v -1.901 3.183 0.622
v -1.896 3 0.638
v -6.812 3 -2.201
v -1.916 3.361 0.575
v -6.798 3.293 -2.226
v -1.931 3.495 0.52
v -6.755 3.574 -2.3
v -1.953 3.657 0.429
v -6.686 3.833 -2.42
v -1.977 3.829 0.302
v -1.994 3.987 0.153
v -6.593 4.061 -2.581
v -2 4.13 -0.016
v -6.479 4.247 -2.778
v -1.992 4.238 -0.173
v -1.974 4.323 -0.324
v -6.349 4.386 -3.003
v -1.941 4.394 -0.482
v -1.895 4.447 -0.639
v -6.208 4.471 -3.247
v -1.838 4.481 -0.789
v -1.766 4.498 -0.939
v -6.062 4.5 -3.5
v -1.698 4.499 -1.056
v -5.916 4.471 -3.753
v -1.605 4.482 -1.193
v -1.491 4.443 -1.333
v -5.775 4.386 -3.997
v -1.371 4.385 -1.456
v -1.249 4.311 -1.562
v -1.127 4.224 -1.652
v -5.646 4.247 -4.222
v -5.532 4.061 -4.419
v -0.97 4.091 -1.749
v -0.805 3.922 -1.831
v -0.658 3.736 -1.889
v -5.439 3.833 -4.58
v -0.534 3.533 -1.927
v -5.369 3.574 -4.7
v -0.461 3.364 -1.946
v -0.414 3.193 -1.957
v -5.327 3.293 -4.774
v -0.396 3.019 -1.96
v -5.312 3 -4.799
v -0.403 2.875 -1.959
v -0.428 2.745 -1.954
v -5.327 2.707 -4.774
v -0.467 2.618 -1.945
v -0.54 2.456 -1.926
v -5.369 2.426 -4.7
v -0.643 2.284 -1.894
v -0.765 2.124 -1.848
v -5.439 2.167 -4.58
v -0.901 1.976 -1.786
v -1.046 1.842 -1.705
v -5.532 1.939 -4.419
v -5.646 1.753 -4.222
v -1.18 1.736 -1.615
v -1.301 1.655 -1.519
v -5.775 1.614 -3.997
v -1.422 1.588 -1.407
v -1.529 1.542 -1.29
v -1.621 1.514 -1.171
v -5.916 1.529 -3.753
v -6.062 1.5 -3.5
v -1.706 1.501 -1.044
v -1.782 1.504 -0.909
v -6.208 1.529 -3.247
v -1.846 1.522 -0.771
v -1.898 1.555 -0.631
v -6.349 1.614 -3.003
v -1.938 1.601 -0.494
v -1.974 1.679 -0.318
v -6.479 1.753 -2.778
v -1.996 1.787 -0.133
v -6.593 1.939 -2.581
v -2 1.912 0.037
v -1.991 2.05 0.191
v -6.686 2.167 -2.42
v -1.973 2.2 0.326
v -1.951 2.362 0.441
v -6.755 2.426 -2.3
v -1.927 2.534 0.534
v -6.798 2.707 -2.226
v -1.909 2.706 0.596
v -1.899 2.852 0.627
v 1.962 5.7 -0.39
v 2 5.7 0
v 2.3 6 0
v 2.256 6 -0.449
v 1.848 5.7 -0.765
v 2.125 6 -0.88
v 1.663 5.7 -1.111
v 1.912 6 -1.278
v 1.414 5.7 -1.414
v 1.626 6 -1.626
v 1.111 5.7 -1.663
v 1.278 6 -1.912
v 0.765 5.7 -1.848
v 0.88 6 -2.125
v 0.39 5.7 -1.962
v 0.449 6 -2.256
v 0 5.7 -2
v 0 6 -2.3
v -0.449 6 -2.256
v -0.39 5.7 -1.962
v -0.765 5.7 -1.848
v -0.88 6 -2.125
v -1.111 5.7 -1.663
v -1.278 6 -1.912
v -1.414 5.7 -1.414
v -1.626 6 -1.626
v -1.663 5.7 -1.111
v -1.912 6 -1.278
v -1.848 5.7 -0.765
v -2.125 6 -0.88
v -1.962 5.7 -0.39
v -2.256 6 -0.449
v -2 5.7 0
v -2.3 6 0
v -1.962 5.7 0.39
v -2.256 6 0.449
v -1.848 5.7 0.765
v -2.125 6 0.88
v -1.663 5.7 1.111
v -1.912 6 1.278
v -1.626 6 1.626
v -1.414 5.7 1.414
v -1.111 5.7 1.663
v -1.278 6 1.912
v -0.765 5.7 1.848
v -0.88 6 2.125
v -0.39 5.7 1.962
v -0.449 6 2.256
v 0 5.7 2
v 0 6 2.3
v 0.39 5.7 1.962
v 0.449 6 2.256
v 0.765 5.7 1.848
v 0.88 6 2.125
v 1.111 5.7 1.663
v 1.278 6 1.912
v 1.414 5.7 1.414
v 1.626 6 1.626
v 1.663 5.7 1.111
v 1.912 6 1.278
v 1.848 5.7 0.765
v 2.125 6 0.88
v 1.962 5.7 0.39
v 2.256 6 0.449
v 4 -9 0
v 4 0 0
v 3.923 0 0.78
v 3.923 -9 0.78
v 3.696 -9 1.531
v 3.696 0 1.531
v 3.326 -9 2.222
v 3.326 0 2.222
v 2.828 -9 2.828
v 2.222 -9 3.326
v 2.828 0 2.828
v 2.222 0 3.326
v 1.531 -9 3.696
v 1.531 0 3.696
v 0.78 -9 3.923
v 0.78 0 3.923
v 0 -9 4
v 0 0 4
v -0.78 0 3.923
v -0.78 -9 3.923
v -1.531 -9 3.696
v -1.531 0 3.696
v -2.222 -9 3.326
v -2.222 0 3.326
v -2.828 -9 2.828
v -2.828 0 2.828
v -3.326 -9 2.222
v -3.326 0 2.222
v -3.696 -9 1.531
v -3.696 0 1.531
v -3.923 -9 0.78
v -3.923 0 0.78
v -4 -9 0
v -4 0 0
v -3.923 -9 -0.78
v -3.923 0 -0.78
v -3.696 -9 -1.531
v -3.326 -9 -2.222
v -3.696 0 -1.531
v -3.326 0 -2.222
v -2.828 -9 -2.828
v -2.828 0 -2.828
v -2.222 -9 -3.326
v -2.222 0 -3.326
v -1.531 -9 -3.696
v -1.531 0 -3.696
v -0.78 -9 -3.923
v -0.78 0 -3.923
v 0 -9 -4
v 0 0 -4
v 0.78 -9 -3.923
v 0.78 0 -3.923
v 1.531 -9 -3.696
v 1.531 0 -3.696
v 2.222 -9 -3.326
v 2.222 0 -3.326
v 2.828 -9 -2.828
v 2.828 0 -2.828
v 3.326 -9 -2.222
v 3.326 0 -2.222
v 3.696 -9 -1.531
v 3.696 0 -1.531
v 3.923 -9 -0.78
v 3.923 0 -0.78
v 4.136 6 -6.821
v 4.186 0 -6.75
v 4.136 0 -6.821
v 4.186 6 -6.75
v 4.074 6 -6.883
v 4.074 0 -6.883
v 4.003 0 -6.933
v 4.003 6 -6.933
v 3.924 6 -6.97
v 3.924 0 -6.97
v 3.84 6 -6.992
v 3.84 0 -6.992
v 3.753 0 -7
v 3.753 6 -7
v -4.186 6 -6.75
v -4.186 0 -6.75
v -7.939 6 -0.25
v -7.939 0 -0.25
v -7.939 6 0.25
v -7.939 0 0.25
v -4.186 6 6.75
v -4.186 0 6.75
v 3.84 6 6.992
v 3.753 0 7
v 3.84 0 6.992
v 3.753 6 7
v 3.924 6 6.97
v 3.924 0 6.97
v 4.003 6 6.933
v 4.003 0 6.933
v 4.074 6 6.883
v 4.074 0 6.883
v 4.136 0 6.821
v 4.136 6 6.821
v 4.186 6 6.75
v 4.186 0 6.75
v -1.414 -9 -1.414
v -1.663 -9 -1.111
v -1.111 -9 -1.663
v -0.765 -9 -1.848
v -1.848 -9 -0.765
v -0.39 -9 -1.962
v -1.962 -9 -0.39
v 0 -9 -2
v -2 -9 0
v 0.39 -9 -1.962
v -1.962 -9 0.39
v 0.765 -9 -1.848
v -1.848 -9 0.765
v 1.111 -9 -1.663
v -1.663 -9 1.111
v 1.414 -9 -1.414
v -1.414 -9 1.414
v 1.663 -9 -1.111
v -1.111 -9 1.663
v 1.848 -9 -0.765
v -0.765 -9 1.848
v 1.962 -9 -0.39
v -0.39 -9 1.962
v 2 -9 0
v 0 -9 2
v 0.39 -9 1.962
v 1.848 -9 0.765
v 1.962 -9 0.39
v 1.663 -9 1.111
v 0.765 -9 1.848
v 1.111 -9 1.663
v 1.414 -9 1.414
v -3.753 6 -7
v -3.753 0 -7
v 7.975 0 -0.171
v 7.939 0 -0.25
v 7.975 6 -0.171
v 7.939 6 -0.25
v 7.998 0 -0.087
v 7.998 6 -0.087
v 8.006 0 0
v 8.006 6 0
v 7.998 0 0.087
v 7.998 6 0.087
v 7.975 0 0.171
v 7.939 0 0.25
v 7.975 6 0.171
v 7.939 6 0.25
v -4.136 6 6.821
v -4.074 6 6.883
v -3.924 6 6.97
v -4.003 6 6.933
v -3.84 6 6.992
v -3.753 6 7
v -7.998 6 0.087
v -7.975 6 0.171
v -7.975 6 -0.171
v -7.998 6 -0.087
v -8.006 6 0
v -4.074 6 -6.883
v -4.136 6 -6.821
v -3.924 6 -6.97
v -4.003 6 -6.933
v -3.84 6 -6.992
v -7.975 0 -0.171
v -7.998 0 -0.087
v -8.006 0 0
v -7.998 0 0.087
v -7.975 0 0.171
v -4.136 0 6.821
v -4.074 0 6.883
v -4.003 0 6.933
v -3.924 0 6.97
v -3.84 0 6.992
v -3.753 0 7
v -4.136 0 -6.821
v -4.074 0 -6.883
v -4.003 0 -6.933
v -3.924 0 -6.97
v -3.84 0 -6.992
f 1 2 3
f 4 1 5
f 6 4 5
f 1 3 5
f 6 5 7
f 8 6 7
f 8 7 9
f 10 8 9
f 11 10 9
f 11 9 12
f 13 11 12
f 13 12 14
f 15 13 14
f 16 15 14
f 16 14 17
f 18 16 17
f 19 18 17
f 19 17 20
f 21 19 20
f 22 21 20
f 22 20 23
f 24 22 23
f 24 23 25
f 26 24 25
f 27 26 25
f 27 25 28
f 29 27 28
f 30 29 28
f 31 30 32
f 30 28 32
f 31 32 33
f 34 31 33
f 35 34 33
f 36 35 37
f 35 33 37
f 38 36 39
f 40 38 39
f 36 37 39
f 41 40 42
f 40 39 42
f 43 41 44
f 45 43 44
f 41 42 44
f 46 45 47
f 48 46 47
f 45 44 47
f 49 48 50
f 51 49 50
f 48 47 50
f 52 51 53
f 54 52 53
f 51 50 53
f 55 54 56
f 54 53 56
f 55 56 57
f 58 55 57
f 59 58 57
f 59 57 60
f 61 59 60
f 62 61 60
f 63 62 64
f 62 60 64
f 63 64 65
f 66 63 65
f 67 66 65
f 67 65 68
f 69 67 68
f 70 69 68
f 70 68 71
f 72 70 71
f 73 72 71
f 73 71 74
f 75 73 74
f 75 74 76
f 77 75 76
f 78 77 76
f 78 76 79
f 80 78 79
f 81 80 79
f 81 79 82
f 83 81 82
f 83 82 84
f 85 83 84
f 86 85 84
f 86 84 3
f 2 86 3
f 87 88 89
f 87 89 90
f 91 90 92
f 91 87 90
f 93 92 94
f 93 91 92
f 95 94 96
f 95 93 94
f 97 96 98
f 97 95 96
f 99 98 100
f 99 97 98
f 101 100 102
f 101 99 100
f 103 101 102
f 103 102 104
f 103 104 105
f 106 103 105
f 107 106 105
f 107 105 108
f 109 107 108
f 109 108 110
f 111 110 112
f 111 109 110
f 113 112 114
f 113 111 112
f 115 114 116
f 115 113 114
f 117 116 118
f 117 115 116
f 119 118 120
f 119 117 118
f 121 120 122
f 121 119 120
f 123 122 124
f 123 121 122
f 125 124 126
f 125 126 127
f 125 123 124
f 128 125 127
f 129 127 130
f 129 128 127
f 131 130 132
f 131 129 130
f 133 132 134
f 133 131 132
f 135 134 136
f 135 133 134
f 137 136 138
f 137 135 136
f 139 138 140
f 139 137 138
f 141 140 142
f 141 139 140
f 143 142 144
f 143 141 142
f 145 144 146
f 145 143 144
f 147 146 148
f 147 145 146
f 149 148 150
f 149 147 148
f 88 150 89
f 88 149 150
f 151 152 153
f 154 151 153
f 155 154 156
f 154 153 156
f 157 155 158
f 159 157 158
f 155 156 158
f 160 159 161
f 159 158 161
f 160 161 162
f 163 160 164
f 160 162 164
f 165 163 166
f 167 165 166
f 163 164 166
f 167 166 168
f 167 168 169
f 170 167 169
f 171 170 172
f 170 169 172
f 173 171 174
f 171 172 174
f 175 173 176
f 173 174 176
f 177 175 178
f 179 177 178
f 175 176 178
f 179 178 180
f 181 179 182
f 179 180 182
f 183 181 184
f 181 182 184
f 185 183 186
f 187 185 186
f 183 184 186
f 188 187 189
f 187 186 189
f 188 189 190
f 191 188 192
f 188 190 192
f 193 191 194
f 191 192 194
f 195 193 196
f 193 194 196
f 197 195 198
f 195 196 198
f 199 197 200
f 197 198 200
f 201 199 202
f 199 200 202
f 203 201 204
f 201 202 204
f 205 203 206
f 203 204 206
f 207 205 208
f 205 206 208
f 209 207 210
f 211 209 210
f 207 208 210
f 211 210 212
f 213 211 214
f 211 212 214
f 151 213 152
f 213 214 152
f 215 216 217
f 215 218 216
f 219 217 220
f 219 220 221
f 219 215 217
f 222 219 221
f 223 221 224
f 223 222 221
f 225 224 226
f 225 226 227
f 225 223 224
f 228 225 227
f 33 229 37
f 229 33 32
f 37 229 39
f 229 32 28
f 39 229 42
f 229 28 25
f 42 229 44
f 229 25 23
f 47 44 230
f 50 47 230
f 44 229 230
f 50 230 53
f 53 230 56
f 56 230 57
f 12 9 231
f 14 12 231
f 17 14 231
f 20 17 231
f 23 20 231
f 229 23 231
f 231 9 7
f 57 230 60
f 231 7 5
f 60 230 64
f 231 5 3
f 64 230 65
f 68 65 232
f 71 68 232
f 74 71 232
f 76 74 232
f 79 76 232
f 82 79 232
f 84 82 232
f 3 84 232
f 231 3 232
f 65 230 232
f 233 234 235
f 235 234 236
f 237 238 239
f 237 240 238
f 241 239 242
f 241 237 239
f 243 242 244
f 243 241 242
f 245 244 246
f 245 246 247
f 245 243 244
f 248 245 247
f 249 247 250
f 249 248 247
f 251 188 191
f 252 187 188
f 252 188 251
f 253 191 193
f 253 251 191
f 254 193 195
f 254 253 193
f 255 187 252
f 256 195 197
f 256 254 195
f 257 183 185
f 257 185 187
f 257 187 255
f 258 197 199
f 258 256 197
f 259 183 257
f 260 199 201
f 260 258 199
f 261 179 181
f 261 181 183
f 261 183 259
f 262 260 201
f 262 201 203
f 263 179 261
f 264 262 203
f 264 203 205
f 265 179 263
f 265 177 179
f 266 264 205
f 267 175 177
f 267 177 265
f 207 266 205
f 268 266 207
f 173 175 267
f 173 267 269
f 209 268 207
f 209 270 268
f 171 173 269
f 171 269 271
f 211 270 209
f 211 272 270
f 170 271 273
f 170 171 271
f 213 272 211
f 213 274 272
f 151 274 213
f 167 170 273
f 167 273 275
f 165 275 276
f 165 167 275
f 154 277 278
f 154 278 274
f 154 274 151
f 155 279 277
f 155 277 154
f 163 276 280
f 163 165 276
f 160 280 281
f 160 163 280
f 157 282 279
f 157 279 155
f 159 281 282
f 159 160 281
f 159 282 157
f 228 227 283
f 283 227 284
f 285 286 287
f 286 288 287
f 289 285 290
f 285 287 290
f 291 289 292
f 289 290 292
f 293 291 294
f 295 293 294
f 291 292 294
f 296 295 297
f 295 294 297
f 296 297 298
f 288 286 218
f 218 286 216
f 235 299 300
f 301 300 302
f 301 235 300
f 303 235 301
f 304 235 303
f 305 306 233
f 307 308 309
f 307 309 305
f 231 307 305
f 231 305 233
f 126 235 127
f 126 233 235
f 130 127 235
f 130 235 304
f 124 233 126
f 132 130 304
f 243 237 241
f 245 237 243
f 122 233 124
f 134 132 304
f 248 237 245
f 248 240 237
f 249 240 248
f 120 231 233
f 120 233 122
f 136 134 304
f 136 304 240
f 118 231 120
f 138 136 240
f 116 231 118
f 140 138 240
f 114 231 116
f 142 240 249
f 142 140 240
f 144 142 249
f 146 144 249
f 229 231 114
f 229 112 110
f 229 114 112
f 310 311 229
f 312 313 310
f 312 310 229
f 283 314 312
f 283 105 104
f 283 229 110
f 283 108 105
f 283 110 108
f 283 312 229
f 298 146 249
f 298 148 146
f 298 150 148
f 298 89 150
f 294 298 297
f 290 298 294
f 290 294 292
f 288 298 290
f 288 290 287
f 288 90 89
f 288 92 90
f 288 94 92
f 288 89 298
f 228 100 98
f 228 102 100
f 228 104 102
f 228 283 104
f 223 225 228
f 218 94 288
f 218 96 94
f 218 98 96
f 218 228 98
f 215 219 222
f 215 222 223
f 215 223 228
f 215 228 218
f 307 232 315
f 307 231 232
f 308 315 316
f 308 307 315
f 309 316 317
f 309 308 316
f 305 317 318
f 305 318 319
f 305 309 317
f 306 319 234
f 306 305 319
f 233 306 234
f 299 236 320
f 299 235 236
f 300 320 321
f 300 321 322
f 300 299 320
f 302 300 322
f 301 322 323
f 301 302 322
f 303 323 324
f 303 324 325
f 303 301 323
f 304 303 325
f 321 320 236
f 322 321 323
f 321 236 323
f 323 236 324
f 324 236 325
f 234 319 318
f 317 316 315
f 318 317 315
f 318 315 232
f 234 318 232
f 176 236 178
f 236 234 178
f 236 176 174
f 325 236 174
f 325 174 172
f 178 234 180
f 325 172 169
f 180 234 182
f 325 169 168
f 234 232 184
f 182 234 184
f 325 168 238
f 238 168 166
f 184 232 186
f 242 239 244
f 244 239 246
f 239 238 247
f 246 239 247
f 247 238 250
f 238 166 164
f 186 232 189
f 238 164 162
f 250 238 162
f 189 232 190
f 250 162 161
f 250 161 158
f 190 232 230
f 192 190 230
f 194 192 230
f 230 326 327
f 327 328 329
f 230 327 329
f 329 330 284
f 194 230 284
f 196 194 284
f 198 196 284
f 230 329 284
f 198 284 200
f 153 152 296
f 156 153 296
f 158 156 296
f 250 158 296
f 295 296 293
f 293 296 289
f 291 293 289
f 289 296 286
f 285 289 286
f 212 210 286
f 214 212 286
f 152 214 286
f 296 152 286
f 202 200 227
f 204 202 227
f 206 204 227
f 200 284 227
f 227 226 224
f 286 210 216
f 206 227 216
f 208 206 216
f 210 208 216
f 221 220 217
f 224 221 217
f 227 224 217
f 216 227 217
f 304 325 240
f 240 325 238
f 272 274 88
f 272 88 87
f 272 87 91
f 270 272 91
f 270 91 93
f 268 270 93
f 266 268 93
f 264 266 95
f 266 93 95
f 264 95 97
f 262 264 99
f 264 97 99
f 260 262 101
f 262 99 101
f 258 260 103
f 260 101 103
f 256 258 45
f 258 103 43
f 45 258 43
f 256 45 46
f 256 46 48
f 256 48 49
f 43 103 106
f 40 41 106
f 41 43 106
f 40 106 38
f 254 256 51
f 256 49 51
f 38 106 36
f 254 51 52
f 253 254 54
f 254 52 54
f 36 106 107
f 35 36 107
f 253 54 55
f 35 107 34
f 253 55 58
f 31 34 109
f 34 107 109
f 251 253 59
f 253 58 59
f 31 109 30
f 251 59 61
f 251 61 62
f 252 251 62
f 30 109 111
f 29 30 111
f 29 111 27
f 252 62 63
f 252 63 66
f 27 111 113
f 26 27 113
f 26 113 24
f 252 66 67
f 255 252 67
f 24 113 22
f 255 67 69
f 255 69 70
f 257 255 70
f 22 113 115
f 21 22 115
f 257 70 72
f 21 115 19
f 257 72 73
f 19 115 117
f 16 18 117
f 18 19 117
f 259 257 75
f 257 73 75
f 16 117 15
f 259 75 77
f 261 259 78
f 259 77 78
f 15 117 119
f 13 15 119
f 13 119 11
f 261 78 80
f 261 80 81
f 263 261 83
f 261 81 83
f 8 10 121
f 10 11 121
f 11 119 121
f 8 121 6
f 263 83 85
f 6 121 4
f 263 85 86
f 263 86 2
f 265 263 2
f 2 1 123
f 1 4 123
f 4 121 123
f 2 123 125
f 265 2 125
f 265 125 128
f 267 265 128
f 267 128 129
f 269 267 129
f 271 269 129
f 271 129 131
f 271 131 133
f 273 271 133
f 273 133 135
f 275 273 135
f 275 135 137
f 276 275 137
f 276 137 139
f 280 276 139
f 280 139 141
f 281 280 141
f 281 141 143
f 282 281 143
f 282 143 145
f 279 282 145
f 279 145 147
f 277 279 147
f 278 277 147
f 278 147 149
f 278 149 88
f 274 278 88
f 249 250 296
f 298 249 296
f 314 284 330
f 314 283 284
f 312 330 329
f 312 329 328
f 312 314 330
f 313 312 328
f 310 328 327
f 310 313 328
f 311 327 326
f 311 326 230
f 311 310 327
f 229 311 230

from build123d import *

# Parameters (mm, degrees)
BOSS_EXTRUDE1_DEPTH = 6
FILLET1_R           = 0.5
SKETCH2_R           = 4
BOSS_EXTRUDE2_DEPTH = 9
SKETCH4_R           = 2
CUT_EXTRUDE1_DEPTH  = 16
CHAMFER1_SIZE       = 0.3
SKETCH5_R           = 1.5
CUT_EXTRUDE2_DEPTH  = 8


with BuildPart() as part:
    # Sketch1 → Boss-Extrude1 (new body)
    with BuildSketch(Plane(origin=(0, 0, 0), x_dir=(1, 0, 0), z_dir=(0, 1, 0))):
        Polygon((8.082903769, 0), (4.041451884, 7), (-4.041451884, 7), (-8.082903769, 0), (-4.041451884, -7), (4.041451884, -7), align=None)
    extrude(amount=BOSS_EXTRUDE1_DEPTH)

    # Fillet1
    fillet1_edges = [part.edges().sort_by_distance(p)[0] for p in [
        (4.041451884, 3, 7),
        (-4.041451884, 3, 7),
        (-8.082903769, 3, 0),
        (-4.041451884, 3, -7),
        (4.041451884, 3, -7),
        (8.082903769, 3, 0),
    ]]
    fillet(fillet1_edges, radius=FILLET1_R)

    # Sketch2 → Boss-Extrude2 (add)
    with BuildSketch(Plane.XZ):
        Circle(SKETCH2_R)
    extrude(amount=BOSS_EXTRUDE2_DEPTH)

    # Sketch4 → Cut-Extrude1 (cut, through all)
    with BuildSketch(Plane(origin=(0, 6, 0), x_dir=(1, 0, 0), z_dir=(0, 1, 0))):
        Circle(SKETCH4_R)
    extrude(amount=-CUT_EXTRUDE1_DEPTH, mode=Mode.SUBTRACT)

    # Chamfer1
    chamfer1_edges = [part.edges().sort_by_distance(p)[0] for p in [
        (-2, 6, 0),
    ]]
    chamfer(chamfer1_edges, length=CHAMFER1_SIZE)

    # Sketch5 → Cut-Extrude2 (cut)
    with BuildSketch(Plane(origin=(-6.062177826, 0, -3.5), x_dir=(-0.5, 0, 0.866025404), z_dir=(-0.866025404, 0, -0.5))):
        with Locations((0, 3)):
            Circle(SKETCH5_R)
    extrude(amount=-CUT_EXTRUDE2_DEPTH, mode=Mode.SUBTRACT)


solid = part.part
